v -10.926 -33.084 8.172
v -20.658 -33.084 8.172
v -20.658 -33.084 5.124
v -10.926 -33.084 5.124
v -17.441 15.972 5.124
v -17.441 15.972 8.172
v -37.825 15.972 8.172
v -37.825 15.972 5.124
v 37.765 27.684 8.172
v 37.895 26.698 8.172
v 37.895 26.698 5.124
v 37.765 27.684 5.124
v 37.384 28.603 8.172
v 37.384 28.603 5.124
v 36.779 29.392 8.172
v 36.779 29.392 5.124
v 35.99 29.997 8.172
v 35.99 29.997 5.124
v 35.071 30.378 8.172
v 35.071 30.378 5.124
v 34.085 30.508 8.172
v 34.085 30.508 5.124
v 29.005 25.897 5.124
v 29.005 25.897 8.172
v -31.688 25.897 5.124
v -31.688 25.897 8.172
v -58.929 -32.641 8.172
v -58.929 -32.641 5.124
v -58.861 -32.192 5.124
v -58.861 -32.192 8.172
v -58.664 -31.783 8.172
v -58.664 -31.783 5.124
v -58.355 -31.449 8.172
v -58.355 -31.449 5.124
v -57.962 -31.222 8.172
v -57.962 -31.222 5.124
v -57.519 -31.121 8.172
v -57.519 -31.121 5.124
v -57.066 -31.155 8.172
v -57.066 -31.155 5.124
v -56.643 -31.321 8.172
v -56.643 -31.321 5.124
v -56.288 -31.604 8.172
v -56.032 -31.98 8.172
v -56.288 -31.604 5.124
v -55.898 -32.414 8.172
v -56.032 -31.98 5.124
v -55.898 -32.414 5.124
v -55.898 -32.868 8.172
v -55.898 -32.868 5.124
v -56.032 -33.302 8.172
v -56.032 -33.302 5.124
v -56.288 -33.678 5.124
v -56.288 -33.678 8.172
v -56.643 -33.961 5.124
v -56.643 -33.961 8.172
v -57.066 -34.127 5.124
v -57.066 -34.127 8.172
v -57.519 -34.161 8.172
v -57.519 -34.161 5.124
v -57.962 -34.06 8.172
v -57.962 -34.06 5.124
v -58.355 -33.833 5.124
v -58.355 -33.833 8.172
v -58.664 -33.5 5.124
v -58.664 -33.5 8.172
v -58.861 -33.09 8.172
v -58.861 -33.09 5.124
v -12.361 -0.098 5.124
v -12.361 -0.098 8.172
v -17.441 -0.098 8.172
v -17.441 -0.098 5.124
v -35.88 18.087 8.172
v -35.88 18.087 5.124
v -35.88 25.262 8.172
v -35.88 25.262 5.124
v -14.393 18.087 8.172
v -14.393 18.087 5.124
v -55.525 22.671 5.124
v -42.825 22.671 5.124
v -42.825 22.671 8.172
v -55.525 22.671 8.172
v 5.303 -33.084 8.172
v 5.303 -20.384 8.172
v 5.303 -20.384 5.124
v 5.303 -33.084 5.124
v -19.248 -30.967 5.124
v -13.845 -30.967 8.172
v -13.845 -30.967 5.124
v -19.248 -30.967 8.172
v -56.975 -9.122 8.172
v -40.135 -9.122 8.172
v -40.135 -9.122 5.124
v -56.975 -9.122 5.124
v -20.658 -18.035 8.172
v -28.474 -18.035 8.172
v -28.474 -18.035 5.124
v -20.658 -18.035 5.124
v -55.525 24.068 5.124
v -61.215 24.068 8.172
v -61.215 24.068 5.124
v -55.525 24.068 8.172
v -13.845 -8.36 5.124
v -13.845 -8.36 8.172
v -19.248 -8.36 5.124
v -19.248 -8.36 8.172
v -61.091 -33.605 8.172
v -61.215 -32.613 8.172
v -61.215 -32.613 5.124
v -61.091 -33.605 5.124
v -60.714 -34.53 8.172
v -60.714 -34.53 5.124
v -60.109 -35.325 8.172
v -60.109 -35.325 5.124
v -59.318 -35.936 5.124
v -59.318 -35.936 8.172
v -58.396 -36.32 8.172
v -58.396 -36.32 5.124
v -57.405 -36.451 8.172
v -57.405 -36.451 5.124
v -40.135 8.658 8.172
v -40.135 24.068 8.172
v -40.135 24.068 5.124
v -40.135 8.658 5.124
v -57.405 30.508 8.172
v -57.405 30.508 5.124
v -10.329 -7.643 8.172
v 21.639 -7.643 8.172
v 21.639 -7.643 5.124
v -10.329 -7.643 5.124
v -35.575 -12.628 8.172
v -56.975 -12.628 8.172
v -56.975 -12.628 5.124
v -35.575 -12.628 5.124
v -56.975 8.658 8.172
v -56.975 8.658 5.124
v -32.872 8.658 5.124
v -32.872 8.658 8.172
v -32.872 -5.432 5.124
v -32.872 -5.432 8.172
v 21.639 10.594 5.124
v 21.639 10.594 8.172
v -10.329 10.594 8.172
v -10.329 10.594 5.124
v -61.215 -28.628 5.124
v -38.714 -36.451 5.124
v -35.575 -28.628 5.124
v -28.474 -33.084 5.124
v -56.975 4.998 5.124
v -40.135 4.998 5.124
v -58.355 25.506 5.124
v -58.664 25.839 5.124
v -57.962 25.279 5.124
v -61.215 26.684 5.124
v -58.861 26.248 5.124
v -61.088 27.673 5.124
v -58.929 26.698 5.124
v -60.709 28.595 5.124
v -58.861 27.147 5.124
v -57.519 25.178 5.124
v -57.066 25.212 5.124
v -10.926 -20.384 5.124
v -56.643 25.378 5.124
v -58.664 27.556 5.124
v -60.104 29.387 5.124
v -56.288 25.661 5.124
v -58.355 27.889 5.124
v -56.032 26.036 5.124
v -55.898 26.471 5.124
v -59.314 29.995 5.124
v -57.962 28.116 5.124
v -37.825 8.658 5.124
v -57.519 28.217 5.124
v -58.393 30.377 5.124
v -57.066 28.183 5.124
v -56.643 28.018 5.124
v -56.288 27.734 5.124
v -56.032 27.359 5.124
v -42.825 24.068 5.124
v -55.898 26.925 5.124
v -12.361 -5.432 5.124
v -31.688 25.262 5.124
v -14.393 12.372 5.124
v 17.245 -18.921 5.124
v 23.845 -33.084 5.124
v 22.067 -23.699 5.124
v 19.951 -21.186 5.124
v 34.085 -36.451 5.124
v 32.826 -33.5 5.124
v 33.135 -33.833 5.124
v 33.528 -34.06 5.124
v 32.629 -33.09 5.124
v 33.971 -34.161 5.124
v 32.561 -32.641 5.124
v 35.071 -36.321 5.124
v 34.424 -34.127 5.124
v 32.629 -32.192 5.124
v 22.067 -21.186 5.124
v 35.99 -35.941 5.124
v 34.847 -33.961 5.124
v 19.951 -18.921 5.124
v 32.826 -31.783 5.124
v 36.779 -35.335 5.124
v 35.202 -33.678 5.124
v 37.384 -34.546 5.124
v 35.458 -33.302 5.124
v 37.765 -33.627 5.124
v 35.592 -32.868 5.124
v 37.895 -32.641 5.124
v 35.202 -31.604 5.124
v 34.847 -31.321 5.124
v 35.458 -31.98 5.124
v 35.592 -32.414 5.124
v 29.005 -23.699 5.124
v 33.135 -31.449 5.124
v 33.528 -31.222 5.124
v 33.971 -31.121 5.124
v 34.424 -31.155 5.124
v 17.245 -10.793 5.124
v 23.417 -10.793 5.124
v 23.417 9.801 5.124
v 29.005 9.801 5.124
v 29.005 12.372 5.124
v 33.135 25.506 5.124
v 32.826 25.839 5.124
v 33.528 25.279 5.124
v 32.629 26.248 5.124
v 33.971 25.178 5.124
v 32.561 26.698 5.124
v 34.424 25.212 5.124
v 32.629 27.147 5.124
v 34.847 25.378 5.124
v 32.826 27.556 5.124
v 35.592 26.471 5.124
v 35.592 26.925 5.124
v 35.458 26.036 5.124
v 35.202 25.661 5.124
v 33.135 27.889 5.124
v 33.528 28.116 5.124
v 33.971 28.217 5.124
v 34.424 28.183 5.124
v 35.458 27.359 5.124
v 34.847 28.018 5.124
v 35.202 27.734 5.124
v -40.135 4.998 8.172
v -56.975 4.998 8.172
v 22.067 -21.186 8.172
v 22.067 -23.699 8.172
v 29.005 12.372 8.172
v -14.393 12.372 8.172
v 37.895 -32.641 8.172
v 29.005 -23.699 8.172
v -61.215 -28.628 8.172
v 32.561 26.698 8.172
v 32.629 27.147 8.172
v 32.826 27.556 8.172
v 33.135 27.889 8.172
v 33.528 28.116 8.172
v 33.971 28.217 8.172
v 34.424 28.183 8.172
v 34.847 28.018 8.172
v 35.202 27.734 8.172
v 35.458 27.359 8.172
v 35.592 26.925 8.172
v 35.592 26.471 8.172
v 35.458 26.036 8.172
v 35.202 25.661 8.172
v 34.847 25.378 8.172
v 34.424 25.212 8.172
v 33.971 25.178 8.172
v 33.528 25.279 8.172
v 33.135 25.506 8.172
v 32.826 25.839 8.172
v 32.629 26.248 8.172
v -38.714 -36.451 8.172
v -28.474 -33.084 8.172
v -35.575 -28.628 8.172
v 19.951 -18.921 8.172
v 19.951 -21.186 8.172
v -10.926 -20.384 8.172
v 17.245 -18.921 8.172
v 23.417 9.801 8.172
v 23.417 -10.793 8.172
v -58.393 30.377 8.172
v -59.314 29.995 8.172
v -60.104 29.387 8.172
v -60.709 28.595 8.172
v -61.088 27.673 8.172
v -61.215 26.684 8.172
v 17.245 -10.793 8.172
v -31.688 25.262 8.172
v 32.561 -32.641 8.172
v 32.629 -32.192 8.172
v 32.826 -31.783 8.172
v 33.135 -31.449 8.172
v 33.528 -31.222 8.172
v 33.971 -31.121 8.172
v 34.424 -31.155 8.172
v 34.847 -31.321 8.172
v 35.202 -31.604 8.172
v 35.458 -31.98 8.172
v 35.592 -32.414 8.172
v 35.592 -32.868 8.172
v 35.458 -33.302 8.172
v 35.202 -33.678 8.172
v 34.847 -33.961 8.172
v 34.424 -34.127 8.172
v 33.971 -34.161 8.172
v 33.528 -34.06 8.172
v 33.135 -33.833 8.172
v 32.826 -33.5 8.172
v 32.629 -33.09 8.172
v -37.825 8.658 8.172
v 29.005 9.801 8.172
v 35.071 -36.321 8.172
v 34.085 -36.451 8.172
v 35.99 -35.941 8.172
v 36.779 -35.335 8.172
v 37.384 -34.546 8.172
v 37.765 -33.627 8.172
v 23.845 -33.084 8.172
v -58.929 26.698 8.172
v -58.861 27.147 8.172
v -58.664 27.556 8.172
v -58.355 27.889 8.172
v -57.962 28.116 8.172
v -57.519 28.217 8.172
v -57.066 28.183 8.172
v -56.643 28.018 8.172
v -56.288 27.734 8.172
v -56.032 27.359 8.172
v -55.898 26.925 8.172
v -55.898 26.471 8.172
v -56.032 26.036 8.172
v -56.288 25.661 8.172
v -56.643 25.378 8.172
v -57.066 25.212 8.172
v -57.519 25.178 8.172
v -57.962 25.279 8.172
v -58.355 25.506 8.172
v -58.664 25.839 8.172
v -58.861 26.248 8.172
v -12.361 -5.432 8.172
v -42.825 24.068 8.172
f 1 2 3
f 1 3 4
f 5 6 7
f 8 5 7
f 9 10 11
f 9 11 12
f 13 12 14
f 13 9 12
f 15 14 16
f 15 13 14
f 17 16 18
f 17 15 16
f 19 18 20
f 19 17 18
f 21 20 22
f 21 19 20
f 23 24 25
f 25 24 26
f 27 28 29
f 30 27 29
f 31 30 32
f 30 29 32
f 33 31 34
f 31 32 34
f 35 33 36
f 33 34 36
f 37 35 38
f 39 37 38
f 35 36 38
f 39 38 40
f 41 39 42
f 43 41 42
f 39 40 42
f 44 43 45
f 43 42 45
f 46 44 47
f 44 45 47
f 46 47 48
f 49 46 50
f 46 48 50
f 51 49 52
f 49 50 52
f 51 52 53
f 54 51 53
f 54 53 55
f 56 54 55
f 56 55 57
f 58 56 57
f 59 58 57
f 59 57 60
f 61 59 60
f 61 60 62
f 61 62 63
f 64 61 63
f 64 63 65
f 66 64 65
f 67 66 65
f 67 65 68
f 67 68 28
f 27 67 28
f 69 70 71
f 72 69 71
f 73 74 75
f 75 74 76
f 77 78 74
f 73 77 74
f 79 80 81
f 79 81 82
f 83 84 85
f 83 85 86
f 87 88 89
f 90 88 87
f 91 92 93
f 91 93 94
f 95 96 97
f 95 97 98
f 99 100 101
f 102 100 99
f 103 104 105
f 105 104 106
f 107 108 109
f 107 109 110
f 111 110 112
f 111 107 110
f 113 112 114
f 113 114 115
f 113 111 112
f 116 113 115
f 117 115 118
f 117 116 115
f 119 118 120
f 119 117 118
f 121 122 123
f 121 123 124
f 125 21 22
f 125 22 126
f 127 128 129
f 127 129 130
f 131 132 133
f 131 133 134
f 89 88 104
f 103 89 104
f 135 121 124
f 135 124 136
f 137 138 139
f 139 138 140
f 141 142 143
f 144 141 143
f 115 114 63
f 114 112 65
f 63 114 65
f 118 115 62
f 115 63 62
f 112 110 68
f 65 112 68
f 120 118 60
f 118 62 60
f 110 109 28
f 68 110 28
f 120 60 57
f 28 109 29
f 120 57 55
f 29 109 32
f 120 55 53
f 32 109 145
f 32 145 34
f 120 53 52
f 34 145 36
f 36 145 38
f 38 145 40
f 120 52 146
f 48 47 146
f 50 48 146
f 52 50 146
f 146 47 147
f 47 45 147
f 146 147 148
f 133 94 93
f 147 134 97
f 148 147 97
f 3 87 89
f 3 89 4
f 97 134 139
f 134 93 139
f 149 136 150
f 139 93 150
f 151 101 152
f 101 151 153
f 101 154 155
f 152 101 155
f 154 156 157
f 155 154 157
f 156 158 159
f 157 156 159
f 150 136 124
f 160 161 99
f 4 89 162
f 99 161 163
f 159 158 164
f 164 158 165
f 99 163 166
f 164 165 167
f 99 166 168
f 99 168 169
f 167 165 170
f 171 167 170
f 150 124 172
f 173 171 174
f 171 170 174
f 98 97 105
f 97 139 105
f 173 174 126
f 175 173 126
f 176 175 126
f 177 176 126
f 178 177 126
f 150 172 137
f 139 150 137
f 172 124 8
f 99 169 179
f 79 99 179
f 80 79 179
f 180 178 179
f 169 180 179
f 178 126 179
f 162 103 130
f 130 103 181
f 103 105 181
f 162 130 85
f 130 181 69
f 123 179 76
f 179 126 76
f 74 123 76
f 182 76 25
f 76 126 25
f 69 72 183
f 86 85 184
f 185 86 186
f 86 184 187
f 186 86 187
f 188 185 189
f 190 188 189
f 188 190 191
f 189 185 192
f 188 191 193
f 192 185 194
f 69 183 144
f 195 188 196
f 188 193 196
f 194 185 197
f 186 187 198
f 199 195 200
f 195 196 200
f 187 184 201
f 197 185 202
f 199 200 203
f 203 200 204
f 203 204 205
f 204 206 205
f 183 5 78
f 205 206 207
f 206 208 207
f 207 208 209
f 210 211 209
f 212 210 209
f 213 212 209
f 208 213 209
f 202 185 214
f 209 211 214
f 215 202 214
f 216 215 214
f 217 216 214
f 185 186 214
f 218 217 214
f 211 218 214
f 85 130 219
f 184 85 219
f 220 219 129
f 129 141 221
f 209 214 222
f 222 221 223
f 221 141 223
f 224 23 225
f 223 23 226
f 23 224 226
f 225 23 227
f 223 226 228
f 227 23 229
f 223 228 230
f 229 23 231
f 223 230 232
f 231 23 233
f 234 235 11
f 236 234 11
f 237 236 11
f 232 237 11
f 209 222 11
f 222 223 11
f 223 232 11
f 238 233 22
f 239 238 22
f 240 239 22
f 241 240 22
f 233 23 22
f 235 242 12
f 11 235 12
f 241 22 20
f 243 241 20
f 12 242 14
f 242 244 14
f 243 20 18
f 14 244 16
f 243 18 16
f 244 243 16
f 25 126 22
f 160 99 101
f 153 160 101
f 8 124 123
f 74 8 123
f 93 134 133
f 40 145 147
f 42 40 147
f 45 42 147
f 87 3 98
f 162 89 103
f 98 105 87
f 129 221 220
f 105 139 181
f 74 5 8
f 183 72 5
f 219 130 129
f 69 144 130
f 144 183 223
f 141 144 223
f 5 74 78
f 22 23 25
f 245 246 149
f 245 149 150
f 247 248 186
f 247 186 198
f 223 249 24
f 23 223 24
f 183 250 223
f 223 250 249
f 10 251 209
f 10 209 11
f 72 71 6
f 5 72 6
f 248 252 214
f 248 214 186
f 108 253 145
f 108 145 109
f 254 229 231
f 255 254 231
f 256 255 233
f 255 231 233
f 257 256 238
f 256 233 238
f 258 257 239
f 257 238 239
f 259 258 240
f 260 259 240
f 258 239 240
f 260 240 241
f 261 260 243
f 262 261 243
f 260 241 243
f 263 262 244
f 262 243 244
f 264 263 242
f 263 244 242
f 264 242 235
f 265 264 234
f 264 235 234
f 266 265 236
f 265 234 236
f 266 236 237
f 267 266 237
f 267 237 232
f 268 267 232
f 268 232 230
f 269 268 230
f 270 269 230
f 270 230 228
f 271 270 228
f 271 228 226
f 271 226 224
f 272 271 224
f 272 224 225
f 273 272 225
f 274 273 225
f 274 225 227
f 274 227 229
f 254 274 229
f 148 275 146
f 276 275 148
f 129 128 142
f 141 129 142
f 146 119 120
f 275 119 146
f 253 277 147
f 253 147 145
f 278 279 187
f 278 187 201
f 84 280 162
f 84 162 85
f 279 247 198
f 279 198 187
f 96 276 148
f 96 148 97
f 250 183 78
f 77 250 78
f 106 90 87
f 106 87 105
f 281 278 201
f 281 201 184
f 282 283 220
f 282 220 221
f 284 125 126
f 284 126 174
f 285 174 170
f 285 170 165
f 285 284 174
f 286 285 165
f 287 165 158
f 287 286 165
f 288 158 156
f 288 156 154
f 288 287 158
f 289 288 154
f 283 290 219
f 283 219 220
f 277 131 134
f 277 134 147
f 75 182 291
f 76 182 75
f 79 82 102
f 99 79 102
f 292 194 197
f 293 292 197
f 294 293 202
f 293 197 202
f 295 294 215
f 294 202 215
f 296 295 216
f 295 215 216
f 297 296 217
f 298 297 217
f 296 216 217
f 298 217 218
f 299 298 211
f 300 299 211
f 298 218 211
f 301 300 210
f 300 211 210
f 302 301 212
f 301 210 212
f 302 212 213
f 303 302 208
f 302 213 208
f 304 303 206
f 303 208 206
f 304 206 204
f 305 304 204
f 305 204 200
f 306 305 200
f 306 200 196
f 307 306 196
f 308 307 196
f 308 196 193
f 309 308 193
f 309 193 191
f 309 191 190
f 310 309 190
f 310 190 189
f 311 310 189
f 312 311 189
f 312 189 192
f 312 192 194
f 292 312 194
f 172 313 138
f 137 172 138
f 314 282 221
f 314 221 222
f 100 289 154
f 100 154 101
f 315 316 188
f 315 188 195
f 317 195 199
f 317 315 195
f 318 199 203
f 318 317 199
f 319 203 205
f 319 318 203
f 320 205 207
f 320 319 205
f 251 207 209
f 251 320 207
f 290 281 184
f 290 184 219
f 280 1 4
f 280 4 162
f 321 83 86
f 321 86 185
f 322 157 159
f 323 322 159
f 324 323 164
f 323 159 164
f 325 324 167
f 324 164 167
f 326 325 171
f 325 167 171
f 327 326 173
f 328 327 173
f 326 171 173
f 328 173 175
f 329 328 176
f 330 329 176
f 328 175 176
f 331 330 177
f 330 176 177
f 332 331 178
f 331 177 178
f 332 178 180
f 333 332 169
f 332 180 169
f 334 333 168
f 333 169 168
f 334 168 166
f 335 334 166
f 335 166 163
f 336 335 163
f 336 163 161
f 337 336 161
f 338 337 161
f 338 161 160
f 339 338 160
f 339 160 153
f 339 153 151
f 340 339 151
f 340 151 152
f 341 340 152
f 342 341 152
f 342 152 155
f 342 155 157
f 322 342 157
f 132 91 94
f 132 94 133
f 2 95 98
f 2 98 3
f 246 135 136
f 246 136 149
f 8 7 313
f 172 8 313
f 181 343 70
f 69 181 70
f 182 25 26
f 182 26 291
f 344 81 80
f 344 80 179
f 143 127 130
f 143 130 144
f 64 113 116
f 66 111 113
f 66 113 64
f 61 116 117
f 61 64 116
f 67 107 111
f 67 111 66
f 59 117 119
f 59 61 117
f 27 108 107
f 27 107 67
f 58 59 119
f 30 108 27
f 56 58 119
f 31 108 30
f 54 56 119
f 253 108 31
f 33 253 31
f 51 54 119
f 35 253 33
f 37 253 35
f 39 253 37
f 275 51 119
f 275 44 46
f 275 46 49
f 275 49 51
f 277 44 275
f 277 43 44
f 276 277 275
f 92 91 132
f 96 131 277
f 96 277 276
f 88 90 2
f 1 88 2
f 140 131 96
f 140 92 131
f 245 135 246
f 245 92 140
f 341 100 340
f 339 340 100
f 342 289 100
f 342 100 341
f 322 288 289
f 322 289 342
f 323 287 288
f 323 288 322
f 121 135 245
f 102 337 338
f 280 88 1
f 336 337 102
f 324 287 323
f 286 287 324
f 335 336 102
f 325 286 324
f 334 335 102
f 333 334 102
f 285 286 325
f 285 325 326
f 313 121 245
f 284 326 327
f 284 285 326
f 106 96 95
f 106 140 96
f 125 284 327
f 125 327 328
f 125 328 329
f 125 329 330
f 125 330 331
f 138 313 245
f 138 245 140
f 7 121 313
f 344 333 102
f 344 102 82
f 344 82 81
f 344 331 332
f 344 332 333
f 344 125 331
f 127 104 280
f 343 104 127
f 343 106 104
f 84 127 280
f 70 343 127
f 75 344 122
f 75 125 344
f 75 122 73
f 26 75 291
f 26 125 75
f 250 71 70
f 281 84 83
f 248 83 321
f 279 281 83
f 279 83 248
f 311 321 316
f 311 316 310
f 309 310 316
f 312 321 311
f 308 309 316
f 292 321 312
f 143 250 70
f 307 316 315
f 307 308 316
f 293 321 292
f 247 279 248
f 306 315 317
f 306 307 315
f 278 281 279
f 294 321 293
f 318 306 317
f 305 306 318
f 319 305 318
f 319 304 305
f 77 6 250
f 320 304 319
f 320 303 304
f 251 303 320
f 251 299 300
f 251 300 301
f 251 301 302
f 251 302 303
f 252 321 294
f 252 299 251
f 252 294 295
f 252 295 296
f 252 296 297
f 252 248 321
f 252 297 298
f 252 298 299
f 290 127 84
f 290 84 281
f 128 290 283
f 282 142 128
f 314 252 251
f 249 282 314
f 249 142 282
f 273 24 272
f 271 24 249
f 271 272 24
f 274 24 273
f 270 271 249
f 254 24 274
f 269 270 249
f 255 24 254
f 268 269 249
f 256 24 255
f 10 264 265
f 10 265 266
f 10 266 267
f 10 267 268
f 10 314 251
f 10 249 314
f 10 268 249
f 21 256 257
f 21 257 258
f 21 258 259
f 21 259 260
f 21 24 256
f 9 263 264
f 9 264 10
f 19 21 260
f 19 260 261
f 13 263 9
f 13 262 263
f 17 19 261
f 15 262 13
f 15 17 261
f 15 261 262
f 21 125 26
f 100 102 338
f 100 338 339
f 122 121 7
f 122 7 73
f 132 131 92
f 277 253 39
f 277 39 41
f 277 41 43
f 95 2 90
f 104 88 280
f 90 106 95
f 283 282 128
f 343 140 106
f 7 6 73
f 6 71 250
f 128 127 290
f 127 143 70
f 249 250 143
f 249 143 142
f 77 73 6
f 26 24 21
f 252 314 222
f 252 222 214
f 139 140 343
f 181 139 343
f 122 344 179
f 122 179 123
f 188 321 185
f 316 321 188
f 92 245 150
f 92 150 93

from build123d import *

# Parameters (mm, degrees)
SKETCH2_W           = 5.4034
SKETCH2_H           = 22.6066
SKETCH2_W_2         = 31.9679
SKETCH2_H_2         = 18.2371
BOSS_EXTRUDE1_DEPTH = 3.048
SKETCH3_R           = 1.338245378
CUT_EXTRUDE1_DEPTH  = 4.048
SKETCH4_R           = 1.524
CUT_EXTRUDE2_DEPTH  = 4.048
SKETCH5_W           = 13.7159
SKETCH5_H           = 5.7149
SKETCH5_W_2         = 4.1917
SKETCH5_H_2         = 7.175
CUT_EXTRUDE3_DEPTH  = 4.048
SKETCH7_W           = 12.7
SKETCH7_H           = 1.397
BOSS_EXTRUDE3_DEPTH = 3.048


with BuildPart() as part:
    # Sketch2 → Boss-Extrude1 (new body)
    with BuildSketch(Plane(origin=(0, 0, 8.171752382), x_dir=(-1, 0, 0), z_dir=(0, 0, -1))):
        with BuildLine():
            Line((-23.844892625, -33.084405696), (-34.084892625, -36.451005696))
            ThreePointArc((-34.084892625, -36.451005696), (-36.778969461, -35.335082532), (-37.894892625, -32.641005696))
            Line((-37.894892625, -32.641005696), (-37.894892625, 26.697694304))
            ThreePointArc((-37.894892625, 26.697694304), (-36.778969461, 29.391771141), (-34.084892625, 30.507694304))
            Line((-34.084892625, 30.507694304), (57.404932375, 30.507694304))
            ThreePointArc((57.404932375, 30.507694304), (60.103884597, 29.386886916), (61.214907375, 26.683892153))
            Line((61.214907375, 26.683892153), (61.214907375, 24.068294304))
            Line((61.214907375, 24.068294304), (40.134807375, 24.068294304))
            Line((40.134807375, 24.068294304), (40.134807375, 8.658194304))
            Line((40.134807375, 8.658194304), (56.975007375, 8.658194304))
            Line((56.975007375, 8.658194304), (56.975007375, 4.997894304))
            Line((56.975007375, 4.997894304), (40.134807375, 4.997894304))
            Line((40.134807375, 4.997894304), (40.134807375, -9.121805696))
            Line((40.134807375, -9.121805696), (56.975007375, -9.121805696))
            Line((56.975007375, -9.121805696), (56.975007375, -12.628005696))
            Line((56.975007375, -12.628005696), (35.575007375, -12.628005696))
            Line((35.575007375, -12.628005696), (35.575007375, -28.627805696))
            Line((35.575007375, -28.627805696), (61.214907375, -28.627805696))
            Line((61.214907375, -28.627805696), (61.214907375, -32.613401529))
            ThreePointArc((61.214907375, -32.613401529), (60.108826144, -35.325305244), (57.405007375, -36.451005696))
            Line((57.405007375, -36.451005696), (38.714307375, -36.451005696))
            Line((38.714307375, -36.451005696), (28.474307375, -33.084405696))
            Line((28.474307375, -33.084405696), (28.474307375, -18.034905696))
            Line((28.474307375, -18.034905696), (20.658107375, -18.034905696))
            Line((20.658107375, -18.034905696), (20.658107375, -33.084405696))
            Line((20.658107375, -33.084405696), (10.926407375, -33.084405696))
            Line((10.926407375, -33.084405696), (10.926407375, -20.384405696))
            Line((10.926407375, -20.384405696), (-5.302892625, -20.384405696))
            Line((-5.302892625, -20.384405696), (-5.302892625, -33.084405696))
            Line((-5.302892625, -33.084405696), (-23.844892625, -33.084405696))
        make_face()
        with Locations((16.546707375, -19.663505696)):
            Rectangle(SKETCH2_W, SKETCH2_H, mode=Mode.SUBTRACT)
        Polygon((-29.004892625, -23.698905696), (-22.066892625, -23.698905696), (-22.066892625, -21.185805696), (-19.950892625, -21.185805696), (-19.950892625, -18.920605696), (-17.244692625, -18.920605696), (-17.244692625, -10.792605696), (-23.416892625, -10.792605696), (-23.416892625, 9.801194304), (-29.004892625, 9.801194304), align=None, mode=Mode.SUBTRACT)
        with Locations((-5.654942625, 1.475544304)):
            Rectangle(SKETCH2_W_2, SKETCH2_H_2, mode=Mode.SUBTRACT)
        Polygon((12.361007375, -0.097605696), (17.441007375, -0.097605696), (17.441007375, 15.972394304), (37.825007375, 15.972394304), (37.825007375, 8.658194304), (32.872007375, 8.658194304), (32.872007375, -5.431505696), (12.361007375, -5.431505696), align=None, mode=Mode.SUBTRACT)
        Polygon((0.677107375, 12.372094304), (-29.004794688, 12.372094304), (-29.004892625, 25.896994304), (31.688307375, 25.896994304), (31.688307375, 18.086994304), (0.677107375, 18.086994304), align=None, mode=Mode.SUBTRACT)
    extrude(amount=BOSS_EXTRUDE1_DEPTH)

    # Sketch3 → Cut-Extrude1 (cut, through all)
    with BuildSketch(Plane(origin=(0, 0, 5.123752382), x_dir=(-1, 0, 0), z_dir=(0, 0, -1))):
        with Locations((57.405007375, -32.641005696)):
            Circle(SKETCH3_R)
        with Locations((-34.084892625, -32.641005696)):
            Circle(SKETCH3_R)
        with Locations((-34.084892625, 26.697694304)):
            Circle(SKETCH3_R)
        with Locations((57.404932375, 26.697694304)):
            Circle(SKETCH3_R)
    extrude(amount=-CUT_EXTRUDE1_DEPTH, mode=Mode.SUBTRACT)

    # Sketch4 → Cut-Extrude2 (cut, through all)
    with BuildSketch(Plane(origin=(0, 0, 5.123752382), x_dir=(-1, 0, 0), z_dir=(0, 0, -1))):
        with Locations((-34.084892625, 26.697694304)):
            Circle(SKETCH4_R)
        with Locations((-34.084892625, -32.641005696)):
            Circle(SKETCH4_R)
        with Locations((57.405007375, -32.641005696)):
            Circle(SKETCH4_R)
        with Locations((57.404932375, 26.697694304)):
            Circle(SKETCH4_R)
    extrude(amount=-CUT_EXTRUDE2_DEPTH, mode=Mode.SUBTRACT)

    # Sketch5 → Cut-Extrude3 (cut, through all)
    with BuildSketch(Plane(origin=(0, 0, 5.123752382), x_dir=(-1, 0, 0), z_dir=(0, 0, -1))):
        with Locations((7.535057375, 15.229544304)):
            Rectangle(SKETCH5_W, SKETCH5_H)
        with Locations((33.784157375, 21.674494304)):
            Rectangle(SKETCH5_W_2, SKETCH5_H_2)
    extrude(amount=-CUT_EXTRUDE3_DEPTH, mode=Mode.SUBTRACT)

    # Sketch7 → Boss-Extrude3 (add)
    with BuildSketch(Plane(origin=(0, 0, 5.123752382), x_dir=(-1, 0, 0), z_dir=(0, 0, -1))):
        with Locations((49.175307375, 23.369794304)):
            Rectangle(SKETCH7_W, SKETCH7_H)
    extrude(amount=-BOSS_EXTRUDE3_DEPTH)


solid = part.part
